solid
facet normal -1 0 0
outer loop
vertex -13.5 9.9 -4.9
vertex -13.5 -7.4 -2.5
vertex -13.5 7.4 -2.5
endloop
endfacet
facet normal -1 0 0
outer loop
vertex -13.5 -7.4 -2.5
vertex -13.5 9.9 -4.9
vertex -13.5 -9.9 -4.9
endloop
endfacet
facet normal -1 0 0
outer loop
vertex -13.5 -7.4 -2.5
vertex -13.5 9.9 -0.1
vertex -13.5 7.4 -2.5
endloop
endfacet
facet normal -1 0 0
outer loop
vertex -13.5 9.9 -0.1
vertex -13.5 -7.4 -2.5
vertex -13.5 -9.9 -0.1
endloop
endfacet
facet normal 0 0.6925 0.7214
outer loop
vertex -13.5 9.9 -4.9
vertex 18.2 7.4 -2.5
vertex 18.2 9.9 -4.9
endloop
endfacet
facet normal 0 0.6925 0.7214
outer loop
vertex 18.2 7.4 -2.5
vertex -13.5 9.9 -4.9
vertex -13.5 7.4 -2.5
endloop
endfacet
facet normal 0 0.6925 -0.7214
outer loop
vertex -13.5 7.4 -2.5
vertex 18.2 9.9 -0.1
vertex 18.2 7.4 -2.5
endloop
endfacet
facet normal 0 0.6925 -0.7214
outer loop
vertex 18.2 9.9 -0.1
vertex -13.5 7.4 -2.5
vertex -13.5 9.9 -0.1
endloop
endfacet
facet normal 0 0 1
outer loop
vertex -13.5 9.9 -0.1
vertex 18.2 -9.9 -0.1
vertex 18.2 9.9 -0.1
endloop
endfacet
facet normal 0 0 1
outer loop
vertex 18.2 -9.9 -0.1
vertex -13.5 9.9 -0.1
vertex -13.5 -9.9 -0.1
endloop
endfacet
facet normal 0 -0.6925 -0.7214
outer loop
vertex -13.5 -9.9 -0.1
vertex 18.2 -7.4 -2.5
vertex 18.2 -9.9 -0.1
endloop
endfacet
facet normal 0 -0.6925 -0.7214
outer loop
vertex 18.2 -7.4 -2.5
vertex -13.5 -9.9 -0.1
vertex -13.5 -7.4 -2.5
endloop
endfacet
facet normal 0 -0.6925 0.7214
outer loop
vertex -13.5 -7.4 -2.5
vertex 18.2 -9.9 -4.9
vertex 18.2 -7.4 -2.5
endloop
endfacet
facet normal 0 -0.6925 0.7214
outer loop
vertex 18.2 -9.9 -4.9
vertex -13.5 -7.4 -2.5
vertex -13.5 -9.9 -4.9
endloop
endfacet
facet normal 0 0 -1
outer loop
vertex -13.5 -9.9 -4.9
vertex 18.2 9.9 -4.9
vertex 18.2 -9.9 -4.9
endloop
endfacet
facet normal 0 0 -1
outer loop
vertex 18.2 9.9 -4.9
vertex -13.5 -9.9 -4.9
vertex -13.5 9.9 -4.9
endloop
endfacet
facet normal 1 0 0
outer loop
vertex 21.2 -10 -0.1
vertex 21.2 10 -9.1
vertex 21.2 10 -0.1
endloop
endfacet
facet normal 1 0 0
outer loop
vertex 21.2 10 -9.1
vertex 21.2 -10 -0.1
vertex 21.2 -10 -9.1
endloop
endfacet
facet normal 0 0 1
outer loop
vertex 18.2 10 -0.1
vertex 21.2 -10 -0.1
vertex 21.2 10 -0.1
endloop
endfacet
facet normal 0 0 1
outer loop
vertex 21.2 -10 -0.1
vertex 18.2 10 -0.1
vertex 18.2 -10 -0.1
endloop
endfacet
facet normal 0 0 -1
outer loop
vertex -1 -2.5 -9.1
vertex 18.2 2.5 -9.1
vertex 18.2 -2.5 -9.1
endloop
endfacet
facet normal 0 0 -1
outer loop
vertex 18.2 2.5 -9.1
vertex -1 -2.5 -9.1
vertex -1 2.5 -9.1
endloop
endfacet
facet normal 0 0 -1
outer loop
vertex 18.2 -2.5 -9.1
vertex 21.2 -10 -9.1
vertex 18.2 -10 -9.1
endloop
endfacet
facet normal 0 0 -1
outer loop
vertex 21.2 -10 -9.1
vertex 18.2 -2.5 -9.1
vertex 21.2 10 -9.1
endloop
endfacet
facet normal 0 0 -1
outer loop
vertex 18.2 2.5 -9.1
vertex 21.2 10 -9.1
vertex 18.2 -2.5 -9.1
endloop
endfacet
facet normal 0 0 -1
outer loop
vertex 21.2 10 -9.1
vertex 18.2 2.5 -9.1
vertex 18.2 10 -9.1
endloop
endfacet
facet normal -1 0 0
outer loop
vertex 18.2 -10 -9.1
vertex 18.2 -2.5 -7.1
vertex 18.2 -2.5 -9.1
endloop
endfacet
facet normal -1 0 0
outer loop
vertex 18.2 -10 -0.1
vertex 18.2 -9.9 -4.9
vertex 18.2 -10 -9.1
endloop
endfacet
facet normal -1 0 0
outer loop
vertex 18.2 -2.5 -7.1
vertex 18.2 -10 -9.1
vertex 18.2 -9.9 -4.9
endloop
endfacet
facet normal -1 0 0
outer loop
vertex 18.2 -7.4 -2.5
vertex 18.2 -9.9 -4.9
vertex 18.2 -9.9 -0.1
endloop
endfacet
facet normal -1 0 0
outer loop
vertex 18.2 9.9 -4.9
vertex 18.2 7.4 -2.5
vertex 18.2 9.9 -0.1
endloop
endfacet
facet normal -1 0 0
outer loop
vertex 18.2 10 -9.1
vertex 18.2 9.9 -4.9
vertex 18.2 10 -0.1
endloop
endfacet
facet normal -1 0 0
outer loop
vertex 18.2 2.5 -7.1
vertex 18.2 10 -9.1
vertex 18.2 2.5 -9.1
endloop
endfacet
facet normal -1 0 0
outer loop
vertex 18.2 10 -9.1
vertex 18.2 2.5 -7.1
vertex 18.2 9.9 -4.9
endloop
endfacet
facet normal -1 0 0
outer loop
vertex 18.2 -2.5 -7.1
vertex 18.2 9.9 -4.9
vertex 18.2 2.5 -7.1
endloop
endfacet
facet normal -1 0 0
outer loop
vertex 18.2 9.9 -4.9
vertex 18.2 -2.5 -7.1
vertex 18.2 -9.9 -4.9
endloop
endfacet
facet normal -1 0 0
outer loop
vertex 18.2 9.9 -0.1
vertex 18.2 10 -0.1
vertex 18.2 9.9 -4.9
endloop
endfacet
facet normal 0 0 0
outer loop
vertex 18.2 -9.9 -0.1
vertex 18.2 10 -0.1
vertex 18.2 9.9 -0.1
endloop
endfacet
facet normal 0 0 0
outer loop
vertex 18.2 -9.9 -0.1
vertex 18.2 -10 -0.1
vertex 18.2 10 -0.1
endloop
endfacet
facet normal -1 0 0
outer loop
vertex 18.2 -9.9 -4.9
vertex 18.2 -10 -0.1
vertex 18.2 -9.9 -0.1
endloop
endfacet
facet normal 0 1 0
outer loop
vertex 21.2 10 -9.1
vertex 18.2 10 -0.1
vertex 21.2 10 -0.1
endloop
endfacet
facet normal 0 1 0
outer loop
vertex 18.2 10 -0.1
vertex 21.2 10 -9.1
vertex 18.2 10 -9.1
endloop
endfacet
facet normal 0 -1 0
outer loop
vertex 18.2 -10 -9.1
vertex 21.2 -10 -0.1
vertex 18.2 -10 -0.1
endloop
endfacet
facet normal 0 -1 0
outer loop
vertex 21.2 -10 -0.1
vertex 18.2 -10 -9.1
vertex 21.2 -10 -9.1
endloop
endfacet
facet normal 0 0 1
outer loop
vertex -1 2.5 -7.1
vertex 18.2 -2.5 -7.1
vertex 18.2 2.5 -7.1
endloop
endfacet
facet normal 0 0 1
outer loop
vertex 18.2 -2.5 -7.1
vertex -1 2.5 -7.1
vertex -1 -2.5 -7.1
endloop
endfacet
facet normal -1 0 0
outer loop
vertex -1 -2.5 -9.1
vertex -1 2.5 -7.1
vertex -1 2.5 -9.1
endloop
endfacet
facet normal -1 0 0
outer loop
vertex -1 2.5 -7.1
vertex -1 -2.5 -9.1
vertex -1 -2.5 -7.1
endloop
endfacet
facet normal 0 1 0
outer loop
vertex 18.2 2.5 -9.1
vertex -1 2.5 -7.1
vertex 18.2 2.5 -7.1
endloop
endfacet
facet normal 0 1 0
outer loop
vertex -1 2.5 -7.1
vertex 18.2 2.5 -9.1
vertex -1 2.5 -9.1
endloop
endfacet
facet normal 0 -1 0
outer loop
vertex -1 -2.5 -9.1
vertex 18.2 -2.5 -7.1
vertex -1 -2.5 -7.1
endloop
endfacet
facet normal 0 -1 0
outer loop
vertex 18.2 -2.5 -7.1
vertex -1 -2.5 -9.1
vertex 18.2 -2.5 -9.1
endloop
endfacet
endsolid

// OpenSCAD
$tolerence = 0.2; //Tolerence for mounting parts

//include <stethoscope_addon_mount.scad>;

module keyway(width, height, waist, depth){
    // keyway is code to handle making a keyway to easily switch out addons

    rotate(a = 90, v = [0, 1, 0]){
        linear_extrude(height = depth, center = true)
        polygon(points = [
                [-width/2, -height/2],
                [0, -waist/2],
                [width/2, -height/2],
                [width/2, height/2],
                [0, waist/2],
                [-width/2, height/2]]
        );
    }
}

translate([3, 0, -5/2]) {
    keyway(5 - $tolerence, 20 - $tolerence, 15 - $tolerence, 30 + 3);
}

translate([19.5 + $tolerence, 0, -4.5 - $tolerence/2]) {
    cube([3, 20, 9], center = true);
}


translate([9, 0, -8 - $tolerence/2]) {
    cube([20, 5, 2], center = true);
}
